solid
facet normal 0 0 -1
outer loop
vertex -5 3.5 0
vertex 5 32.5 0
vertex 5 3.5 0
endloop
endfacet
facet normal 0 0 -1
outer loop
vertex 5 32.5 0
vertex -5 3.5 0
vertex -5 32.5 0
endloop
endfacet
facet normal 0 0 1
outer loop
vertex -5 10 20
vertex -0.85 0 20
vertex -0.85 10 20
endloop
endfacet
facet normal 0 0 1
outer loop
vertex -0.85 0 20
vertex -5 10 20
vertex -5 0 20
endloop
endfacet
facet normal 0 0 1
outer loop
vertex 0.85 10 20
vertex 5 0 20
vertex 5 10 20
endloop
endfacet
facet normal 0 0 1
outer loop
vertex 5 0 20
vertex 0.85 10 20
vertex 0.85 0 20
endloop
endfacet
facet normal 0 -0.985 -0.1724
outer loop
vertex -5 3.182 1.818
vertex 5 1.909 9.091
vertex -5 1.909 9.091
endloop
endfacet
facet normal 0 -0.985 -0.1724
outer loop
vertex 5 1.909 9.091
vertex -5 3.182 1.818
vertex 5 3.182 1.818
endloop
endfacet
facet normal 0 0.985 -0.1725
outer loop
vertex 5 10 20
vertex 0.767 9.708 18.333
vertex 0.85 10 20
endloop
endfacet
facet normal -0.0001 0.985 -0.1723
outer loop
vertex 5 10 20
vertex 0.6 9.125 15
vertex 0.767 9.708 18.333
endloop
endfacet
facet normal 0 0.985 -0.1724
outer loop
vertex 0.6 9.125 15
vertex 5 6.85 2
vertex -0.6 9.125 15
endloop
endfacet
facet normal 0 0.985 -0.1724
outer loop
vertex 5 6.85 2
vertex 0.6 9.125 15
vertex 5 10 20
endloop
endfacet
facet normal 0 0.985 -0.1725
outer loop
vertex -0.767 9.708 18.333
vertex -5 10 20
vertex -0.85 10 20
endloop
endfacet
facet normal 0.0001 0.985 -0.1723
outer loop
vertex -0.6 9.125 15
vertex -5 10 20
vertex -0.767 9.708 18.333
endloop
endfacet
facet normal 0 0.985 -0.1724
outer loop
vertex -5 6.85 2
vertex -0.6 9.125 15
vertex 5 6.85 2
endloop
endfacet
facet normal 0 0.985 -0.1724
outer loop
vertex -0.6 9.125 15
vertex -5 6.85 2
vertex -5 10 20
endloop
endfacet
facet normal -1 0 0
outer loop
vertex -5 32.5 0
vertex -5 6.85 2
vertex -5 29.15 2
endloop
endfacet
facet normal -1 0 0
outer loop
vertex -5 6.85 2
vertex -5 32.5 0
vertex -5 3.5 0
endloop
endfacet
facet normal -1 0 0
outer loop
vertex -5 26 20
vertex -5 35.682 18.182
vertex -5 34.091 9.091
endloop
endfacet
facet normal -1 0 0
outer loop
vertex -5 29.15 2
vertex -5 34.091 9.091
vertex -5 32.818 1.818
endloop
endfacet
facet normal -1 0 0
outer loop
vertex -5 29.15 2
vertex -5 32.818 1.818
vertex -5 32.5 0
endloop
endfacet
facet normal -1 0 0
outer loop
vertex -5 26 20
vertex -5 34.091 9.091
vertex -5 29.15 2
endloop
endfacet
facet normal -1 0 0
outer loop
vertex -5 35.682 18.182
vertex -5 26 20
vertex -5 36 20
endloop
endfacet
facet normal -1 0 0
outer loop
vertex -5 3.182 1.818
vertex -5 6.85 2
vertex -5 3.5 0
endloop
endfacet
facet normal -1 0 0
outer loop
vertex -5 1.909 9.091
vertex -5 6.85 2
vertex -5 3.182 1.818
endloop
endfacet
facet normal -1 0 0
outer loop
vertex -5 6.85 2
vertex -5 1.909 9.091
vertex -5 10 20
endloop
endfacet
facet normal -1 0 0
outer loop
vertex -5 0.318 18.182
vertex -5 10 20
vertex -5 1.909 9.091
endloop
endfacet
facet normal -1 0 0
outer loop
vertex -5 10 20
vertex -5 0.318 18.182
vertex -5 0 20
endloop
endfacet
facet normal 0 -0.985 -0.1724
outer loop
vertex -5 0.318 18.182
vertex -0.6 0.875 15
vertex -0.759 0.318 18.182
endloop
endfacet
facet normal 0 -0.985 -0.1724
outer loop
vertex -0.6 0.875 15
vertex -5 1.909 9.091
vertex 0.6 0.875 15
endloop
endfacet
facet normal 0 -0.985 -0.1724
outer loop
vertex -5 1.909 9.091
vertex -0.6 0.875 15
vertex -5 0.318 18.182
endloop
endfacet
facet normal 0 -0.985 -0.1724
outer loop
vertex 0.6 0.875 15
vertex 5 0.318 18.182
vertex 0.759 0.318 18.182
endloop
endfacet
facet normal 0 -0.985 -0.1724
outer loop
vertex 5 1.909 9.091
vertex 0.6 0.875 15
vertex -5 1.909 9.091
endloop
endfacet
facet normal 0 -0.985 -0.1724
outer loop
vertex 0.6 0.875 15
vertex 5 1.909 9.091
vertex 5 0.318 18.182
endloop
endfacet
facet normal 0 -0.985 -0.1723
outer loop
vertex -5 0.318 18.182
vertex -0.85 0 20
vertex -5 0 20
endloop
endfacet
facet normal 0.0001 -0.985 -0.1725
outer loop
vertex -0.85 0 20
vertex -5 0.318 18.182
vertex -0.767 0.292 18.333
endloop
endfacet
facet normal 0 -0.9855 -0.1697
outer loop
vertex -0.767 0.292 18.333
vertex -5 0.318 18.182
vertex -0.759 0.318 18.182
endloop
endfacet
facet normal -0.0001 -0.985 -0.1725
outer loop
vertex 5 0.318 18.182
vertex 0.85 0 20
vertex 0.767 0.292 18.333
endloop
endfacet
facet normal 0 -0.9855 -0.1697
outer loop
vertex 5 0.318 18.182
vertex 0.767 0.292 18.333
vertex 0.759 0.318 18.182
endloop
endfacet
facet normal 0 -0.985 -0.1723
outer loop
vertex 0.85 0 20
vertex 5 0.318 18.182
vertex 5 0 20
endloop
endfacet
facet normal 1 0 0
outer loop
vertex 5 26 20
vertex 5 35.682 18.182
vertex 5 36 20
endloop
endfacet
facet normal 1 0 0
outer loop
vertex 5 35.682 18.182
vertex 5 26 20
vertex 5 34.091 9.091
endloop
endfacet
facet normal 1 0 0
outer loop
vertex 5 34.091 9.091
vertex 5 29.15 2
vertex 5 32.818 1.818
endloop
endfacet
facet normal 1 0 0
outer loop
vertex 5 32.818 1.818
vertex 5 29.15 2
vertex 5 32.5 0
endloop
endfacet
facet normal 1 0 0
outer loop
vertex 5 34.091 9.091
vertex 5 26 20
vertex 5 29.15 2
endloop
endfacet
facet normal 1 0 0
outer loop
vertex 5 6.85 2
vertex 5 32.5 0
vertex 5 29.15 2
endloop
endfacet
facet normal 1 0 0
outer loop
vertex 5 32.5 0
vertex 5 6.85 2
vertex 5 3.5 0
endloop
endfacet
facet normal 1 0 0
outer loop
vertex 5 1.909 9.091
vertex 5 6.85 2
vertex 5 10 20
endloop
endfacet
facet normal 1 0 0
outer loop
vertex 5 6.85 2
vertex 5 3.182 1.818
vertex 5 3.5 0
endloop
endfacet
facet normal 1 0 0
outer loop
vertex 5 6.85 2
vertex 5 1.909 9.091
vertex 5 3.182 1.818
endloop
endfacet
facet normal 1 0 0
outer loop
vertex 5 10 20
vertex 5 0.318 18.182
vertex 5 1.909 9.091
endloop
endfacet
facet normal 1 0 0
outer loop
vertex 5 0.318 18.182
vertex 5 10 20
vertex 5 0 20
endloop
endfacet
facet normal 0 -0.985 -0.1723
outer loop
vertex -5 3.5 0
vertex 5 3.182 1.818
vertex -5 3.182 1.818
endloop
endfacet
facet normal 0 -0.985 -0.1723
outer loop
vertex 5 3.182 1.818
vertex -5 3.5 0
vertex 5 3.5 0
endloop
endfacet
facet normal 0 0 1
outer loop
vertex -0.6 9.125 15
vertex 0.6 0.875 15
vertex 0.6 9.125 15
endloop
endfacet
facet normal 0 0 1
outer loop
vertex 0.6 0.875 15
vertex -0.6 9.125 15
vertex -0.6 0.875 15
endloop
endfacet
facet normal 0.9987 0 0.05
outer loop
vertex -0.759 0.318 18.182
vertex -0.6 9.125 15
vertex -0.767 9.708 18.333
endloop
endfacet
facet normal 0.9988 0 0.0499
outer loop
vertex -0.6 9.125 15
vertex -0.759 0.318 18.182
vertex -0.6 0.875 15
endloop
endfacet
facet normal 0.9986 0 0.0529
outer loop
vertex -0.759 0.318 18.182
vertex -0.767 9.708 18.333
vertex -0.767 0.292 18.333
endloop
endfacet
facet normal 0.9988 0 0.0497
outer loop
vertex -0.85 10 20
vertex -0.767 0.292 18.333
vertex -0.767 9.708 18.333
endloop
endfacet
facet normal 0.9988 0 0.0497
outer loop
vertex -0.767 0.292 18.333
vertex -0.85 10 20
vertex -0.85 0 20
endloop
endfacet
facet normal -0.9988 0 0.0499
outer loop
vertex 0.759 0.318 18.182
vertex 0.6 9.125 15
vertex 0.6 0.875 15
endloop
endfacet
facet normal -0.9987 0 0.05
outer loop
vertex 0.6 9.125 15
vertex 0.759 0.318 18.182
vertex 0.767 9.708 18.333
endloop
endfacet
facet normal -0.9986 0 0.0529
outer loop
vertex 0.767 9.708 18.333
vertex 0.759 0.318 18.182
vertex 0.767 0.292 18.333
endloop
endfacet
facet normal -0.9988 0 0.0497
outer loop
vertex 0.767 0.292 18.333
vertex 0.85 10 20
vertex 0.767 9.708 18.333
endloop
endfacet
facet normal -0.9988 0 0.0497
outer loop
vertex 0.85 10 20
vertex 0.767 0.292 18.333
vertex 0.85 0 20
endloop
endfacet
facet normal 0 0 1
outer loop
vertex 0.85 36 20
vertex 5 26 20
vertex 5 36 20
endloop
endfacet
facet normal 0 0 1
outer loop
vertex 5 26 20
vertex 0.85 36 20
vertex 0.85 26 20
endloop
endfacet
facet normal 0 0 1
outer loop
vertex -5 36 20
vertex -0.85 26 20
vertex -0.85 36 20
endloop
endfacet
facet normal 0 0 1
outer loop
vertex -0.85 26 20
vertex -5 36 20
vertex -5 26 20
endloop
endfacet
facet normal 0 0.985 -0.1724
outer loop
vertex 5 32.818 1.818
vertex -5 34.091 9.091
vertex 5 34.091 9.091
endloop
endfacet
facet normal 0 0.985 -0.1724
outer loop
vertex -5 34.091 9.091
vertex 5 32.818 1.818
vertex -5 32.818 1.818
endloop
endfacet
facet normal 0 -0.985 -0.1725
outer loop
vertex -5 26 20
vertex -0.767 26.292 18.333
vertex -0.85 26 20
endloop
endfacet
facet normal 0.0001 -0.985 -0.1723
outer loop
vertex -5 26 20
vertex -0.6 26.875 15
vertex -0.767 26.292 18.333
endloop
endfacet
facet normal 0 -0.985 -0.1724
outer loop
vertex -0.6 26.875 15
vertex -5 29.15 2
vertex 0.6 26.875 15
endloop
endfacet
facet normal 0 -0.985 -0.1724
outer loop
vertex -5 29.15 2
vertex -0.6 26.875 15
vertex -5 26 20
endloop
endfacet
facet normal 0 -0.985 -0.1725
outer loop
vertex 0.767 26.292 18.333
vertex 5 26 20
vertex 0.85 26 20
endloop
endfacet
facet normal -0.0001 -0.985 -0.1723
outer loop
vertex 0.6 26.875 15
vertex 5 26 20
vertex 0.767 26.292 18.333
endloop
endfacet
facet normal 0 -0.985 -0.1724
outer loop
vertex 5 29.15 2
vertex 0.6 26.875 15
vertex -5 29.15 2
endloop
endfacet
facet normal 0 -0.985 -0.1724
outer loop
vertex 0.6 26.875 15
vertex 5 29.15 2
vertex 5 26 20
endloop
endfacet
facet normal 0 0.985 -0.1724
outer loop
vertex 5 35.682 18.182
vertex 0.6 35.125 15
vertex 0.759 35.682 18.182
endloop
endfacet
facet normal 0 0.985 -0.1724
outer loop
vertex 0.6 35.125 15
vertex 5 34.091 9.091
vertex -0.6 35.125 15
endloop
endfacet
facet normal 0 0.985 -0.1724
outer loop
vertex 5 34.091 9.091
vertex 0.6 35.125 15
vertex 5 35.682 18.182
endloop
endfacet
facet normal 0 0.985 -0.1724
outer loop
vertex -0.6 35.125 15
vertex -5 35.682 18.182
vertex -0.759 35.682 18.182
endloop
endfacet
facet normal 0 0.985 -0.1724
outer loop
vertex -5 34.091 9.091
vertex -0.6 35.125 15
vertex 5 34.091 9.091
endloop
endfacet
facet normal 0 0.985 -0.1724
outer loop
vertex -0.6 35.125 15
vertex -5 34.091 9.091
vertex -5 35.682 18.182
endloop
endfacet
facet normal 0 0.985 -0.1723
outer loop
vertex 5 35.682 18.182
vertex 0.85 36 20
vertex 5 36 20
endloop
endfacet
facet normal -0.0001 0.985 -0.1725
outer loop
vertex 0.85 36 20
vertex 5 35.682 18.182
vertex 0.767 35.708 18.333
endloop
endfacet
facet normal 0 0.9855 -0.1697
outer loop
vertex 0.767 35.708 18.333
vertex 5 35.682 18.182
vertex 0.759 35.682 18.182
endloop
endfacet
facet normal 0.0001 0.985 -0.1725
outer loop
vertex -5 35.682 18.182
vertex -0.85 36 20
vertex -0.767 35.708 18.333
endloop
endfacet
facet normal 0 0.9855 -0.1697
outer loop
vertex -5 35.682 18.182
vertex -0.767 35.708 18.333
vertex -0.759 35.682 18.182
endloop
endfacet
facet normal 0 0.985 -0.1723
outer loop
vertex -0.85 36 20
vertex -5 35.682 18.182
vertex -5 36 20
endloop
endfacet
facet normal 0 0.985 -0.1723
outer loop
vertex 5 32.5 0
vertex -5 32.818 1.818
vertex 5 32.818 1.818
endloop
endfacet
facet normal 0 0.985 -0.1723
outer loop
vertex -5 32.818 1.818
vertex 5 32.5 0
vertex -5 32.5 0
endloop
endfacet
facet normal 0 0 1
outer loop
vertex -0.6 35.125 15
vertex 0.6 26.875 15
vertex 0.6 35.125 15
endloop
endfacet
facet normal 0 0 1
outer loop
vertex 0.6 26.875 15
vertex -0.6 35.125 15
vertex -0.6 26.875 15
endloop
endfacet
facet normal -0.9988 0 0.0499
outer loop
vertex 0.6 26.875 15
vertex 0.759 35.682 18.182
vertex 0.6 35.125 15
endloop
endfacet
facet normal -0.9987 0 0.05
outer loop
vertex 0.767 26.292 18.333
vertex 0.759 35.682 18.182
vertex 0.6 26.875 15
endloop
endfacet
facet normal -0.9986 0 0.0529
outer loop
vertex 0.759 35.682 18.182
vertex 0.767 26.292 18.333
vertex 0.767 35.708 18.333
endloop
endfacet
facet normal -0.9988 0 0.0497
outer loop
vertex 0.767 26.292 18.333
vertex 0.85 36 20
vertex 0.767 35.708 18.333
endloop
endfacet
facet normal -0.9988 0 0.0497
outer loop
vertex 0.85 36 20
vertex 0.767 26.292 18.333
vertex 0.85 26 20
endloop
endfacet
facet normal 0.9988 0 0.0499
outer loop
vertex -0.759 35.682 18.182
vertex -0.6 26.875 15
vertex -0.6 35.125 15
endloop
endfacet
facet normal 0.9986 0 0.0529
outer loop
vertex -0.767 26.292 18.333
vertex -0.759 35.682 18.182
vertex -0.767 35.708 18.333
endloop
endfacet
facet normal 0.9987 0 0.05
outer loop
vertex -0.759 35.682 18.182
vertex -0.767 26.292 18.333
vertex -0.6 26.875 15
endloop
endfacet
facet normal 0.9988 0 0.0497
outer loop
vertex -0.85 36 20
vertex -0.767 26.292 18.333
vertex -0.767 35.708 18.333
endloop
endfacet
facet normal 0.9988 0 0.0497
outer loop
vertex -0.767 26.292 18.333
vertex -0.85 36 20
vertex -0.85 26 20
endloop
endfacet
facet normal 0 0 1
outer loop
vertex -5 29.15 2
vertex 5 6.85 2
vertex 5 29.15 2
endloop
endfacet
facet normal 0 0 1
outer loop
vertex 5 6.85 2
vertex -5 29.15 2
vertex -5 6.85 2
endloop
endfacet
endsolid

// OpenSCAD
// $fa=1;
// $fs=0.4;

// Main customisation
wire_diameter=1.5;
bridge_distance=16;
bridge_height=18;

// Other params
wire_diameter_min=wire_diameter-0.3;
wire_diameter_max=wire_diameter+0.2;
wire_hole_depth=5;
support_top_thickness=10;
support_top_width=10;
support_bottom_thickness=3;
support_bottom_width=10;
support_base_height=2;

module support() {
    difference() {
        // Support
        translate([0, support_top_thickness/2])
            linear_extrude(height=bridge_height+support_base_height, scale=[support_top_width/support_bottom_width, support_top_thickness/support_bottom_thickness])
            square([support_bottom_width, support_bottom_thickness], center=true);
        // Wire hole
        translate([0, 0, bridge_height+support_base_height-wire_hole_depth])
            linear_extrude(height=wire_hole_depth, scale=[wire_diameter_max/wire_diameter_min, 1])
            translate([-wire_diameter_min/2, 0])
            square([wire_diameter_min, support_top_thickness]);
    }
}

support();
translate([0, support_top_thickness*2+bridge_distance, 0])
    rotate([0, 0, 180])
    support();
//Base
translate([-support_bottom_width/2,support_top_thickness/2,0])
    cube([support_bottom_width, bridge_distance+support_top_thickness, support_base_height]);
